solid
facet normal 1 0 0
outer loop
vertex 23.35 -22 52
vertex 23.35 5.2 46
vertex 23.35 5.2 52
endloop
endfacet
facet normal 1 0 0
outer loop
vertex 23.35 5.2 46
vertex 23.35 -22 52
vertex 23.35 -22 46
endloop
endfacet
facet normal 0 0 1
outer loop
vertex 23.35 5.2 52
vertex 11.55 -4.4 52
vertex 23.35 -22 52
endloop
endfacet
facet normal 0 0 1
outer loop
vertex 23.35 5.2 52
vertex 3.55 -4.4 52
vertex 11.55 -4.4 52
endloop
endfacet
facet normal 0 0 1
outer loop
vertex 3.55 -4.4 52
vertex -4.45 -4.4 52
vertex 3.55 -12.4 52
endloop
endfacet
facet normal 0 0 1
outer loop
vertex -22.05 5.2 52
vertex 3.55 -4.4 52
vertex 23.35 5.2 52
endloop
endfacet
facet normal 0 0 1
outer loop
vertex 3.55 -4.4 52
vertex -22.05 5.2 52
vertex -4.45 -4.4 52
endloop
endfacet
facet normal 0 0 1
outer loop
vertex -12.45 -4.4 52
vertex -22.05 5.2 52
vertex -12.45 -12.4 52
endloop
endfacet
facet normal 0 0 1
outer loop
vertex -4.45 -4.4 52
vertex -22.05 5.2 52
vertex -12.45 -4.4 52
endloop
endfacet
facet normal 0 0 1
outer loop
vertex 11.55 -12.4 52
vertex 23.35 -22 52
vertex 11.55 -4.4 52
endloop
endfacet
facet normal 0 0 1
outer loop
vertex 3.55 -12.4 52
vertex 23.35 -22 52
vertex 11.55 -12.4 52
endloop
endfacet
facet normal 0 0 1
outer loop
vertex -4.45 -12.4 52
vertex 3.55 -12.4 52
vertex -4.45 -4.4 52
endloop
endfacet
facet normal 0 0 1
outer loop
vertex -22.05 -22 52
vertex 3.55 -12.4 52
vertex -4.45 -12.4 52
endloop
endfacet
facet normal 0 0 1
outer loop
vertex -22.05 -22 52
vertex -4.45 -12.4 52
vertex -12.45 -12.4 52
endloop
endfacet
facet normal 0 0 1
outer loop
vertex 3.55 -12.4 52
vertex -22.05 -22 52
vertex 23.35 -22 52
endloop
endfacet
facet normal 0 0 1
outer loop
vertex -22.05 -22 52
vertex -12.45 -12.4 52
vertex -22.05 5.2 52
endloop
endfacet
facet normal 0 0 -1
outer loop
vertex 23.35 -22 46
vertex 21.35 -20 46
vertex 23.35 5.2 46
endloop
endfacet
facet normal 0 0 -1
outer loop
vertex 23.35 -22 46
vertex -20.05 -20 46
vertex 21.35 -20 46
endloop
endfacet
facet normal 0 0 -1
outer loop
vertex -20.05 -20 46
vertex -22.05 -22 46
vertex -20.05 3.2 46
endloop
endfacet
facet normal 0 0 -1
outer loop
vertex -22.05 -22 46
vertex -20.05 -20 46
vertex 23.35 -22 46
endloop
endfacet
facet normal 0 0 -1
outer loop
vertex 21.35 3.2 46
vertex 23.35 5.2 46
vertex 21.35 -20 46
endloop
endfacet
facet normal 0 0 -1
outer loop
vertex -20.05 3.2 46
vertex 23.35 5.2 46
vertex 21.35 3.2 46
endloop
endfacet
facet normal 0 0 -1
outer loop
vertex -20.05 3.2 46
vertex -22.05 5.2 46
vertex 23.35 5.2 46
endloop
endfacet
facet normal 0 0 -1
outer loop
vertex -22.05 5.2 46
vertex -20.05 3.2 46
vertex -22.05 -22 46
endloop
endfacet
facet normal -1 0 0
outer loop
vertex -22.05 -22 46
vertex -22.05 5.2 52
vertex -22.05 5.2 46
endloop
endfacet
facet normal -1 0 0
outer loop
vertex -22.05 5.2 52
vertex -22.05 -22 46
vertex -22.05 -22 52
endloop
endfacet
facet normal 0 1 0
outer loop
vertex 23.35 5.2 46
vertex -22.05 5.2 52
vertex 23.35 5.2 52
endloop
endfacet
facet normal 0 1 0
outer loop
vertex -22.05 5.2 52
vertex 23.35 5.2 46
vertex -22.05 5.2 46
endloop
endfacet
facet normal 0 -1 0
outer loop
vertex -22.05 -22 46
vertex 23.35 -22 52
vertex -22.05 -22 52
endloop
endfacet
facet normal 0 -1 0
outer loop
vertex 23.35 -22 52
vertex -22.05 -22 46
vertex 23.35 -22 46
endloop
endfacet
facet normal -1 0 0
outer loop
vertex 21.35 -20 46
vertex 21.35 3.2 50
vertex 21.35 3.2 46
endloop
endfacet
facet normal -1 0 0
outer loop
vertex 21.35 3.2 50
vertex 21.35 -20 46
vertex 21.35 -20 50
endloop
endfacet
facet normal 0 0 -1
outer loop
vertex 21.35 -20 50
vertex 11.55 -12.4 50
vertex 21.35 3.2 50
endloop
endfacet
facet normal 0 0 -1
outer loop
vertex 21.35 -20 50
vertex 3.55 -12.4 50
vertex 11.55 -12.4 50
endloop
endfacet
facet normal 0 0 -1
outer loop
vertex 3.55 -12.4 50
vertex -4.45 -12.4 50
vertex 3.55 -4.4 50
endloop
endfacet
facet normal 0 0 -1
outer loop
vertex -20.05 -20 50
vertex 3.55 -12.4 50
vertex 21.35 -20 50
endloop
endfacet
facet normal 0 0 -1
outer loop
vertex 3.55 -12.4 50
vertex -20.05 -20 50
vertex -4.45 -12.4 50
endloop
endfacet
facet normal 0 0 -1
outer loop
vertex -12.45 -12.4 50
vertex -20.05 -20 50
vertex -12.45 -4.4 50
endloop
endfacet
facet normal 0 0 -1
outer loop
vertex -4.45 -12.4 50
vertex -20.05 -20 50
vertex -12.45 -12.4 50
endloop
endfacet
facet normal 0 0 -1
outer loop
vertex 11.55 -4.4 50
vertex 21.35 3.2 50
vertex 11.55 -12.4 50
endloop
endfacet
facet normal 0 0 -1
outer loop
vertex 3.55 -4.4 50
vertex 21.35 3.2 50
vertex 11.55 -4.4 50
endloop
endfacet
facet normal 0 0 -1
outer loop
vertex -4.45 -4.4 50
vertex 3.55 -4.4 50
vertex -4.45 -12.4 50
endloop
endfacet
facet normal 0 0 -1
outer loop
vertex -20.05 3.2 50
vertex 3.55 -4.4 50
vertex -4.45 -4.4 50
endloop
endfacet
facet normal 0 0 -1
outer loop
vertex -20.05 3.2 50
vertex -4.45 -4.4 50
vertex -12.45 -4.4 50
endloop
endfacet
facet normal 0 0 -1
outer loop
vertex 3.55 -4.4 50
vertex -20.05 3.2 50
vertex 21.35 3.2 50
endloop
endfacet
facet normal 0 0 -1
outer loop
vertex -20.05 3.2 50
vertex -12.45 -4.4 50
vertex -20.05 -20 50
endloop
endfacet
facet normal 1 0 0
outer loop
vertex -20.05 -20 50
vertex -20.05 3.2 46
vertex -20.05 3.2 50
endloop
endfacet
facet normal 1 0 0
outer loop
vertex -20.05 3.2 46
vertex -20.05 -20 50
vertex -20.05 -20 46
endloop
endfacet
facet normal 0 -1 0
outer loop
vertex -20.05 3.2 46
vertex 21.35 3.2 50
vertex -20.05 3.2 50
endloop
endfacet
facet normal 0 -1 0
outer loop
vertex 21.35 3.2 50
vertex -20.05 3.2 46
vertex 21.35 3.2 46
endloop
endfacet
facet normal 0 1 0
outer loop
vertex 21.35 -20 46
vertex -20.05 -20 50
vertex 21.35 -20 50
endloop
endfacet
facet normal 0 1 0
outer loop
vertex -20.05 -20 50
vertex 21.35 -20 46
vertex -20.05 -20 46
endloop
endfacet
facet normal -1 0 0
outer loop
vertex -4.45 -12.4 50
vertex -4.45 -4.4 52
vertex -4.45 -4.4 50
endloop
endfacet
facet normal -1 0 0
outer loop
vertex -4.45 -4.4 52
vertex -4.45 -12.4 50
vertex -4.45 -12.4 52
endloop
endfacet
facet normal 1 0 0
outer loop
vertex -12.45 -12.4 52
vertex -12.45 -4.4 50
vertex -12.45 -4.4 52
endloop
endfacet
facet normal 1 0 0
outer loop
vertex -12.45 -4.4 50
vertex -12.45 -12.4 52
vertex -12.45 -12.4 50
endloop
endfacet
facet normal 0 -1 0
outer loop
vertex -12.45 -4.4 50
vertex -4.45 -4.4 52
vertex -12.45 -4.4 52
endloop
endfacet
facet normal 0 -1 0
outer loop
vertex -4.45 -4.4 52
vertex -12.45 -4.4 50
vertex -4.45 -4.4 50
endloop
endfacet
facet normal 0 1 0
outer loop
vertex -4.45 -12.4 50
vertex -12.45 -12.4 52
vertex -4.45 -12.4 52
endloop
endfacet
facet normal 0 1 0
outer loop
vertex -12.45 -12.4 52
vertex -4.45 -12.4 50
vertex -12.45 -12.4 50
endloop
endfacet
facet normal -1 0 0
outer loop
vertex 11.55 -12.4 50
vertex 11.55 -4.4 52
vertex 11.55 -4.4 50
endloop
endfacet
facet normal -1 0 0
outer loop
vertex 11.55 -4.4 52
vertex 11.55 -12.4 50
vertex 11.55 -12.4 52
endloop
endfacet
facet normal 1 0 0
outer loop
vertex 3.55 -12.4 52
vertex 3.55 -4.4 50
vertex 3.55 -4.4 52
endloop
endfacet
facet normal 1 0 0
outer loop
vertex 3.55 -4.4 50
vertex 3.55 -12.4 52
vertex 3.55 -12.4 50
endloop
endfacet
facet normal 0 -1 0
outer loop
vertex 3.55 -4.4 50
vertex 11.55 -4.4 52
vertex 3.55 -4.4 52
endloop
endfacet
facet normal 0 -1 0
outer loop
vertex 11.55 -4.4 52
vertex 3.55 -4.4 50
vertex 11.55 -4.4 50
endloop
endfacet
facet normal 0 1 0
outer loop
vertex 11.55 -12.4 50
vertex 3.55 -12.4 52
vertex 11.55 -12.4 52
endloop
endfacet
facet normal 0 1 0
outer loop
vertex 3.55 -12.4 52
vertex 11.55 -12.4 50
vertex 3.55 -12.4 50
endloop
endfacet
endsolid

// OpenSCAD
$fn = 50;

render_platform = false;
render_stage = false;
render_sensor_cap = true;
render_solenoid = false;
render_cartridge = false;

// all units in millimeters

solenoid_body_color = "Red";
// dimensions for solenoid at http://www.amazon.com/gp/product/B00DUYPQHU/ref=oh_aui_detailpage_o03_s00?ie=UTF8&psc=1
solenoid_body_height = 30;
solenoid_body_width = 25;
solenoid_body_length = 51;

solenoid_rod_color = "Black";
solenoid_stroke = 7.1;
solenoid_rod_min = 6;

platform_color = "LightBlue";
platform_height = 16;
platform_back_margin = 15;
platform_width = 80;
platform_length = 120;
platform_anchor_tolerance = 0.04;
platform_anchor_r = 3 + platform_anchor_tolerance; // half of d plus 0.04 tolerance
echo("platform_anchor_r = ", platform_anchor_r);
platform_anchor_rk = 9.78 / 2 + platform_anchor_tolerance; // half of dk plus 0.04 tolerance
echo("platform_anchor_rk = ", platform_anchor_rk);
platform_anchor_k = (5.7 + 0.3) * 2; // 0.3mm extra depth, and k is doubled for modeling
echo("platform_anchor_k = ", platform_anchor_k);
platform_anchor_spacing = 50;
platform_anchor_setback = -platform_anchor_spacing / 2;
platform_wiring_slot_length = 4;
platform_wiring_slot_width = 10;
platform_wiring_slot_margin = 4;

teflon_pad_thickness = 0.8;

stage_color = "LightGreen";
stage_elevation = 38;
stage_height = stage_elevation - platform_height - 2 * teflon_pad_thickness;
stage_bevel_radius = 2;
stage_width = 40;

platform_side_width = 10;
echo("platform_side_width = ", platform_side_width);
platform_side_length = platform_anchor_spacing - 2 * platform_anchor_rk;
echo("platform_side_length = ", platform_side_length);
platform_side_height = stage_elevation - platform_height;
echo("platform_side_height = ", platform_side_height);

stage_length = platform_side_length - solenoid_stroke;
echo("stage_length = ", stage_length);

platform_bumper_height = platform_side_height;
echo("platform_bumper_height = ", platform_bumper_height);
platform_bumper_length = 10;
echo("platform_bumper_length = ", platform_bumper_length);
platform_bumper_width = (platform_width - stage_width) / 2 - platform_side_width;
echo("platform_bumper_width = ", platform_bumper_width);

stage_rail_length = stage_length - platform_bumper_length - teflon_pad_thickness;
echo("stage_rail_length = ", stage_rail_length);
stage_rail_width = platform_width - 2 * platform_side_width - 3.5 * teflon_pad_thickness;
echo("stage_rail_width = ", stage_rail_width);
stage_rail_height = 0.5 * platform_side_height - 2 * teflon_pad_thickness;
echo("stage_rail_height = ", stage_rail_height);

platform_rail_width = platform_bumper_width - 2 * teflon_pad_thickness;
echo("platform_rail_width = ", platform_rail_width);
platform_rail_length = platform_side_length - platform_bumper_length;
echo("platform_rail_length = ", platform_rail_length);
platform_rail_height = 0.5 * platform_side_height - 2 * teflon_pad_thickness;
echo("platform_rail_height = ", platform_rail_height);

cartridge_well_width = 8;
cartridge_well_distance_from_centerline = 4;
cartridge_path_width = 1.5;
accessory_x_spacing = 16;
accessory_y_offset = 12;
accessory_x_offset = cartridge_well_width;
echo("accessory_x_offset = ", accessory_x_offset);

solenoid_margin = 0.5;
solenoid_podium_length = solenoid_body_length + 2 * solenoid_margin;
echo("solenoid_podium_length = ", solenoid_podium_length);
solenoid_podium_width = solenoid_body_width + 2 * solenoid_margin;
echo("solenoid_podium_width = ", solenoid_podium_width);

//stage_center_of_mass_y = 2 * teflon_pad_thickness + (stage_height * stage_width * stage_length * (stage_height / 2) + 2 * stage_rail_height * (stage_rail_width - stage_width) * stage_rail_length * (stage_rail_height / 2)) / (stage_height * stage_width * stage_length + stage_rail_height * 2 * (stage_rail_width - stage_width) * stage_rail_length);

stage_center_of_mass_y = 12.5;
echo("stage_center_of_mass_y = ", stage_center_of_mass_y);
solenoid_podium_height = stage_center_of_mass_y - solenoid_body_height / 2;
echo("solenoid_podium_height = ", solenoid_podium_height);
echo("solenoid_elevation = ", platform_height + solenoid_podium_height + solenoid_body_height);

support_height = stage_height;
support_z_offset = platform_height + 2 * teflon_pad_thickness;

if (render_platform) {
	// platform
	color(platform_color) {
		difference() {
			translate([-(platform_length / 2 - platform_anchor_spacing / 2 - platform_back_margin), 0, platform_height / 2])
				cube([platform_length, platform_width, platform_height], center = true);

	// anchor holes
			translate([platform_anchor_spacing + platform_anchor_setback, platform_anchor_spacing / 2, platform_height]) {
				cylinder(r = platform_anchor_r, h = 2 * platform_height, center = true);
				cylinder(r = platform_anchor_rk, h = platform_anchor_k, center = true);
			}
			translate([platform_anchor_setback, -platform_anchor_spacing / 2, platform_height]) {
				cylinder(r = platform_anchor_r, h = 2 * platform_height, center = true);
				cylinder(r = platform_anchor_rk, h = platform_anchor_k, center = true);
			}
			translate([platform_anchor_spacing + platform_anchor_setback, -platform_anchor_spacing / 2, platform_height]) {
				cylinder(r = platform_anchor_r, h = 2 * platform_height, center = true);
				cylinder(r = platform_anchor_rk, h = platform_anchor_k, center = true);
			}
			translate([platform_anchor_setback, platform_anchor_spacing / 2, platform_height]) {
				cylinder(r = platform_anchor_r, h = 2 * platform_height, center = true);
				cylinder(r = platform_anchor_rk, h = platform_anchor_k, center = true);
			}

	// wire terminal holes
			translate([-38, -26, platform_height]) {
				cylinder(r = 1.5, h = 40, center = true);
			}
			translate([-46, -26, platform_height]) {
				cylinder(r = 1.5, h = 40, center = true);
			}
			translate([-54, -26, platform_height]) {
				cylinder(r = 1.5, h = 40, center = true);
			}
			translate([-62, -26, platform_height]) {
				cylinder(r = 1.5, h = 40, center = true);
			}

	// solenoid holes
			translate([-platform_side_length / 2 - solenoid_rod_min - 8, solenoid_podium_width / 2 - 4, platform_height]) {
				cylinder(r = 2, h = 40, center = true);
			}
			translate([-platform_side_length / 2 - solenoid_rod_min - 8, -solenoid_podium_width / 2 + 4, platform_height]) {
				cylinder(r = 2, h = 40, center = true);
			}
			translate([-platform_side_length / 2 - solenoid_rod_min - 43, solenoid_podium_width / 2 - 4, platform_height]) {
				cylinder(r = 2, h = 40, center = true);
			}
			translate([-platform_side_length / 2 - solenoid_rod_min - 43, -solenoid_podium_width / 2 + 4, platform_height]) {
				cylinder(r = 2, h = 40, center = true);
			}

			if (solenoid_podium_height < 0) {
				translate([-(platform_side_length + solenoid_podium_length) / 2 - solenoid_rod_min + solenoid_margin, 0, platform_height + solenoid_podium_height / 2]) {
					cube([solenoid_podium_length, solenoid_podium_width, -2 * solenoid_podium_height], center = true);
//					translate([6, 0, -0.7]) cube([solenoid_podium_length - 12, solenoid_podium_width, -2 * solenoid_podium_height], center = true);
				}
			}
		}
	}
	
	// platform sides
	color(platform_color) {
		translate([0,  (platform_width - platform_side_width) / 2, platform_height + platform_side_height / 2])
			cube([platform_side_length, platform_side_width, platform_side_height], center = true);
	}
	
	color(platform_color) {
		translate([0, -(platform_width - platform_side_width) / 2, platform_height + platform_side_height / 2])
			cube([platform_side_length, platform_side_width, platform_side_height], center = true);
	}
	
	// platform rails
	color(platform_color) {
		translate([-(platform_side_length - platform_rail_length) / 2 + platform_bumper_length, ((platform_width - platform_rail_width) / 2 - platform_side_width), platform_height + platform_side_height - platform_rail_height / 2])
			cube([platform_rail_length, platform_rail_width, platform_rail_height], center = true);
	}
	
	color(platform_color) {
		translate([-(platform_side_length - platform_rail_length) / 2 + platform_bumper_length,  -((platform_width - platform_rail_width) / 2 - platform_side_width), platform_height + platform_side_height - platform_rail_height / 2])
			cube([platform_rail_length, platform_rail_width, platform_rail_height], center = true);
	}
	
	// platform stage bumper
	color(platform_color) {
		translate([-(platform_side_length - platform_bumper_length) / 2, platform_width / 2 - platform_side_width - platform_rail_width / 2, platform_height + platform_bumper_height / 2])
			cube([platform_bumper_length, platform_rail_width, platform_bumper_height], center = true);
	}
	
	color(platform_color) {
		translate([-(platform_side_length - platform_bumper_length) / 2, -(platform_width / 2 - platform_side_width - platform_rail_width / 2), platform_height + platform_bumper_height / 2])
			cube([platform_bumper_length, platform_rail_width, platform_bumper_height], center = true);
	}
	
	// solenoid podium
	if (solenoid_podium_height > 0) {
		color(platform_color) {
			translate([-(platform_side_length + solenoid_podium_length) / 2, 0, platform_height + solenoid_podium_height / 2])
				cube([solenoid_podium_length, solenoid_podium_width, solenoid_podium_height], center = true);
		}
	}

	// overhang supports
//	for (x = [-15:5:15]) {
//		translate([x + 2, (platform_width - platform_side_width) / 2 - 12, platform_height]) {
//					translate([0.45, 0, 0]) cube([0.1, 5, 0.5]);
//					translate([0.25, 0, 0.5]) cube([0.5, 5, 0.5]);
//					translate([0, 0, 1]) cube([1, 5, platform_side_height - platform_rail_height - 2]);
//					translate([0.25, 0, platform_side_height - platform_rail_height - 1]) cube([0.5, 5, 0.5]);
//					translate([0.45, 0, platform_side_height - platform_rail_height - 0.5]) cube([0.1, 5, 0.5]);
//				}
//	}
//
//	for (x = [-15:5:15]) {
//		translate([x + 2, -(platform_width - platform_side_width) / 2 + 7, platform_height]) {
//					translate([0.45, 0, 0]) cube([0.1, 5, 0.5]);
//					translate([0.25, 0, 0.5]) cube([0.5, 5, 0.5]);
//					translate([0, 0, 1]) cube([1, 5, platform_side_height - platform_rail_height - 2]);
//					translate([0.25, 0, platform_side_height - platform_rail_height - 1]) cube([0.5, 5, 0.5]);
//					translate([0.45, 0, platform_side_height - platform_rail_height - 0.5]) cube([0.1, 5, 0.5]);
//				}
//	}
}

stage_x_offset = (stage_length - platform_side_length) / 2;
echo("stage_x_offset = ", stage_x_offset);
if (render_stage) {
	// stage 
	color(stage_color) {
		difference() {
			translate([stage_x_offset, 0, stage_elevation - stage_height / 2])
				cube([stage_length, stage_width, stage_height], center = true);

	// solenoid rod hole
			translate([-platform_side_length / 2, 0, platform_height + solenoid_podium_height + solenoid_body_height / 2])
				rotate([0, 90, 0]) cylinder(r = 1.75, h = 30, center = true);

	// solenoid rod nut slot
			translate([4 - platform_side_length / 2, 0, platform_height + solenoid_podium_height + solenoid_body_height / 2 - 3])
				cube([2.8, 6, 16], center = true);

	// accessory hole slots
	
			translate([0, accessory_y_offset, stage_elevation - 4])
				cube([46, 6, 2.8], center = true);

	// accessory holes
			for (x = [-accessory_x_offset, accessory_x_spacing - accessory_x_offset]) {
			translate([stage_x_offset + x, accessory_y_offset, stage_elevation])
				cylinder(r = 1.5, h = 20, center = true);
		}
	}
}
translate([3, 0, 0]) {
	translate([stage_x_offset - accessory_x_offset - 11.5, -accessory_y_offset - 8, stage_elevation - 0.1])
			difference() {
				cube([39.4, 23.2, 11]);	
				translate([1, 1, 0]) cube([37.4, 21.2, 11]);	
				translate([-1, 4, 0]) cube([10, 10, 2.5]);	
			}

	translate([stage_x_offset - accessory_x_offset - 10.5, -accessory_y_offset - 8, stage_elevation - 0.1]) {
				difference() {
					cube([16, 23.2, 8]);
					translate([0, 2, 0]) cube([16, 19.2, 8]);
					translate([-1, 4, 0]) cube([10, 10, 2.5]);	
				}
				translate([20, 1, 8]) cube([2, 1, 3]);
				translate([20, 21.2, 8]) cube([2, 1, 3]);
			}
	translate([28 + stage_x_offset - accessory_x_offset, 15.2 - accessory_y_offset, stage_elevation - 0.1]) {
				rotate(180, 0, 0) difference() {
					cube([23.2, 23.2, 4]);
					translate([12, 2, 0]) cube([16, 19.2, 4]);
				}
			}
}

	// stage rail
	
	color(stage_color) {
		translate([stage_x_offset + (stage_length - stage_rail_length) / 2, 0, platform_height + 2 * teflon_pad_thickness + stage_rail_height / 2])
			cube([stage_rail_length, stage_rail_width, stage_rail_height], center = true);
	}

//	for (y = [-19:4.5:0]) {
//		translate([13.5, y + 1, support_z_offset]) {
//			cube([8, 1, support_height - 1]);
//			translate([0, 0.25, support_height - 1]) cube([8, 0.5, 0.5]);
//			translate([0, 0.4, support_height - 0.5]) cube([8, 0.2, 0.5]);
//			}
//	}

}

if (render_sensor_cap) {
	translate([1, -2, -2]) {
		translate([stage_x_offset - accessory_x_offset - 11.5, -accessory_y_offset - 8, stage_elevation + 10]) {
			difference() {
				cube([45.4, 27.2, 6]);	
				translate([2, 2, -2]) cube([41.4, 23.2, 6]);	
				translate([9.6, 9.6, 0]) cube([8, 8, 12]);	
				translate([25.6, 9.6, 0]) cube([8, 8, 12]);	
			}
		}
	}
}

if (render_solenoid) {
	// solenoid body
	color(solenoid_body_color) {
		translate([-(platform_side_length + solenoid_body_length) / 2 - solenoid_rod_min, 0, platform_height + solenoid_podium_height + solenoid_body_height / 2])
			cube([solenoid_body_length, solenoid_body_width, solenoid_body_height], center = true);
	}
	
	// solenoid rod
	color(solenoid_rod_color) {
		translate([-(platform_side_length + solenoid_stroke) / 2, 0, platform_height + solenoid_podium_height + solenoid_body_height / 2])
		rotate([0, 90, 0])
			cylinder(r = 1, h = solenoid_stroke, center = true);
	}
}

p_y = 1.5; // path width
p_x = 4; // path length
w_x = 6; // well length
w_y = 8; // well width
n = 8; // number of wells 
m = 8; //separation from midline
	
module base_card()
{translate([-5,-20])square([100,40]);}

module corner(f)
{difference(){square([f,f]);circle(r=f,$fn=50);}}

module path()
{union(){
	translate([w_x/2,-w_y/2])square([p_x,p_y]); // actual path
	translate([w_x/2+1,-w_y/2+p_y+1])rotate(180)corner(1);}}//rounded corners

module path2()
{union(){translate([2*w_x+1,-w_y/2])square([p_x,p_y]); // actual path
			 //translate([2*w_x+2,-p_y/2-1])rotate(90)corner(1);
	      translate([2*w_x+2,-w_y/2+1+p_y])rotate(180)corner(1);//rounded corners	
	      //translate([2*w_x+p_x,-p_y/2-1])corner(1);
	      translate([2*w_x+p_x,-w_y/2+1+p_y])rotate(270)corner(1);}}//rounded corners

module well()
{difference ()
	{	square([w_x,w_y], center=true); 
		translate([w_x/2-2,w_y/2-2])corner(2);
		translate([-(w_x/2-2),w_y/2-2])rotate(90)corner(2);
		//translate([-(w_x/2-2),-(w_y/2-2)])rotate(180)corner(2);
		//translate([w_x/2-2,-(w_y/2-2)])rotate(270)corner(2);
   }}

module color_well() // last well
{translate([n*(w_x+p_x)+1,0])
{difference ()
	{	square([w_y,w_y], center=true); 
		translate([w_y/2-2,w_y/2-2])corner(2);
		translate([-(w_y/2-2),w_y/2-2])rotate(90)corner(2);
		//translate([-(w_y/2-2),-(w_y/2-2)])rotate(180)corner(2);
		//translate([w_y/2-2,-(w_y/2-2)])rotate(270)corner(2);
   }}}

module sample_well() // first well
{union(){translate([0,-w_y/2-1])square([2*w_x+1,w_y+2]); path2();}}

module control_well() // first well
{union(){translate([p_x+w_x,0])well(); path2();}}

module set(){union(){color_well(); 
	{for (i =[2:(n-1)]){translate([i*(p_x+w_x),0]){well();path();}}} }} // 1 set of wells, paths and comb
	
if (render_cartridge) {
	translate([0, -20, 45]) rotate(90, 0, 0) linear_extrude(height = 2, center = true)
	difference(){base_card(); 
						translate([0,-m]){sample_well(); set(); square([12,6],center=true);} 
						translate([0,m]){control_well(); set();}}
}
